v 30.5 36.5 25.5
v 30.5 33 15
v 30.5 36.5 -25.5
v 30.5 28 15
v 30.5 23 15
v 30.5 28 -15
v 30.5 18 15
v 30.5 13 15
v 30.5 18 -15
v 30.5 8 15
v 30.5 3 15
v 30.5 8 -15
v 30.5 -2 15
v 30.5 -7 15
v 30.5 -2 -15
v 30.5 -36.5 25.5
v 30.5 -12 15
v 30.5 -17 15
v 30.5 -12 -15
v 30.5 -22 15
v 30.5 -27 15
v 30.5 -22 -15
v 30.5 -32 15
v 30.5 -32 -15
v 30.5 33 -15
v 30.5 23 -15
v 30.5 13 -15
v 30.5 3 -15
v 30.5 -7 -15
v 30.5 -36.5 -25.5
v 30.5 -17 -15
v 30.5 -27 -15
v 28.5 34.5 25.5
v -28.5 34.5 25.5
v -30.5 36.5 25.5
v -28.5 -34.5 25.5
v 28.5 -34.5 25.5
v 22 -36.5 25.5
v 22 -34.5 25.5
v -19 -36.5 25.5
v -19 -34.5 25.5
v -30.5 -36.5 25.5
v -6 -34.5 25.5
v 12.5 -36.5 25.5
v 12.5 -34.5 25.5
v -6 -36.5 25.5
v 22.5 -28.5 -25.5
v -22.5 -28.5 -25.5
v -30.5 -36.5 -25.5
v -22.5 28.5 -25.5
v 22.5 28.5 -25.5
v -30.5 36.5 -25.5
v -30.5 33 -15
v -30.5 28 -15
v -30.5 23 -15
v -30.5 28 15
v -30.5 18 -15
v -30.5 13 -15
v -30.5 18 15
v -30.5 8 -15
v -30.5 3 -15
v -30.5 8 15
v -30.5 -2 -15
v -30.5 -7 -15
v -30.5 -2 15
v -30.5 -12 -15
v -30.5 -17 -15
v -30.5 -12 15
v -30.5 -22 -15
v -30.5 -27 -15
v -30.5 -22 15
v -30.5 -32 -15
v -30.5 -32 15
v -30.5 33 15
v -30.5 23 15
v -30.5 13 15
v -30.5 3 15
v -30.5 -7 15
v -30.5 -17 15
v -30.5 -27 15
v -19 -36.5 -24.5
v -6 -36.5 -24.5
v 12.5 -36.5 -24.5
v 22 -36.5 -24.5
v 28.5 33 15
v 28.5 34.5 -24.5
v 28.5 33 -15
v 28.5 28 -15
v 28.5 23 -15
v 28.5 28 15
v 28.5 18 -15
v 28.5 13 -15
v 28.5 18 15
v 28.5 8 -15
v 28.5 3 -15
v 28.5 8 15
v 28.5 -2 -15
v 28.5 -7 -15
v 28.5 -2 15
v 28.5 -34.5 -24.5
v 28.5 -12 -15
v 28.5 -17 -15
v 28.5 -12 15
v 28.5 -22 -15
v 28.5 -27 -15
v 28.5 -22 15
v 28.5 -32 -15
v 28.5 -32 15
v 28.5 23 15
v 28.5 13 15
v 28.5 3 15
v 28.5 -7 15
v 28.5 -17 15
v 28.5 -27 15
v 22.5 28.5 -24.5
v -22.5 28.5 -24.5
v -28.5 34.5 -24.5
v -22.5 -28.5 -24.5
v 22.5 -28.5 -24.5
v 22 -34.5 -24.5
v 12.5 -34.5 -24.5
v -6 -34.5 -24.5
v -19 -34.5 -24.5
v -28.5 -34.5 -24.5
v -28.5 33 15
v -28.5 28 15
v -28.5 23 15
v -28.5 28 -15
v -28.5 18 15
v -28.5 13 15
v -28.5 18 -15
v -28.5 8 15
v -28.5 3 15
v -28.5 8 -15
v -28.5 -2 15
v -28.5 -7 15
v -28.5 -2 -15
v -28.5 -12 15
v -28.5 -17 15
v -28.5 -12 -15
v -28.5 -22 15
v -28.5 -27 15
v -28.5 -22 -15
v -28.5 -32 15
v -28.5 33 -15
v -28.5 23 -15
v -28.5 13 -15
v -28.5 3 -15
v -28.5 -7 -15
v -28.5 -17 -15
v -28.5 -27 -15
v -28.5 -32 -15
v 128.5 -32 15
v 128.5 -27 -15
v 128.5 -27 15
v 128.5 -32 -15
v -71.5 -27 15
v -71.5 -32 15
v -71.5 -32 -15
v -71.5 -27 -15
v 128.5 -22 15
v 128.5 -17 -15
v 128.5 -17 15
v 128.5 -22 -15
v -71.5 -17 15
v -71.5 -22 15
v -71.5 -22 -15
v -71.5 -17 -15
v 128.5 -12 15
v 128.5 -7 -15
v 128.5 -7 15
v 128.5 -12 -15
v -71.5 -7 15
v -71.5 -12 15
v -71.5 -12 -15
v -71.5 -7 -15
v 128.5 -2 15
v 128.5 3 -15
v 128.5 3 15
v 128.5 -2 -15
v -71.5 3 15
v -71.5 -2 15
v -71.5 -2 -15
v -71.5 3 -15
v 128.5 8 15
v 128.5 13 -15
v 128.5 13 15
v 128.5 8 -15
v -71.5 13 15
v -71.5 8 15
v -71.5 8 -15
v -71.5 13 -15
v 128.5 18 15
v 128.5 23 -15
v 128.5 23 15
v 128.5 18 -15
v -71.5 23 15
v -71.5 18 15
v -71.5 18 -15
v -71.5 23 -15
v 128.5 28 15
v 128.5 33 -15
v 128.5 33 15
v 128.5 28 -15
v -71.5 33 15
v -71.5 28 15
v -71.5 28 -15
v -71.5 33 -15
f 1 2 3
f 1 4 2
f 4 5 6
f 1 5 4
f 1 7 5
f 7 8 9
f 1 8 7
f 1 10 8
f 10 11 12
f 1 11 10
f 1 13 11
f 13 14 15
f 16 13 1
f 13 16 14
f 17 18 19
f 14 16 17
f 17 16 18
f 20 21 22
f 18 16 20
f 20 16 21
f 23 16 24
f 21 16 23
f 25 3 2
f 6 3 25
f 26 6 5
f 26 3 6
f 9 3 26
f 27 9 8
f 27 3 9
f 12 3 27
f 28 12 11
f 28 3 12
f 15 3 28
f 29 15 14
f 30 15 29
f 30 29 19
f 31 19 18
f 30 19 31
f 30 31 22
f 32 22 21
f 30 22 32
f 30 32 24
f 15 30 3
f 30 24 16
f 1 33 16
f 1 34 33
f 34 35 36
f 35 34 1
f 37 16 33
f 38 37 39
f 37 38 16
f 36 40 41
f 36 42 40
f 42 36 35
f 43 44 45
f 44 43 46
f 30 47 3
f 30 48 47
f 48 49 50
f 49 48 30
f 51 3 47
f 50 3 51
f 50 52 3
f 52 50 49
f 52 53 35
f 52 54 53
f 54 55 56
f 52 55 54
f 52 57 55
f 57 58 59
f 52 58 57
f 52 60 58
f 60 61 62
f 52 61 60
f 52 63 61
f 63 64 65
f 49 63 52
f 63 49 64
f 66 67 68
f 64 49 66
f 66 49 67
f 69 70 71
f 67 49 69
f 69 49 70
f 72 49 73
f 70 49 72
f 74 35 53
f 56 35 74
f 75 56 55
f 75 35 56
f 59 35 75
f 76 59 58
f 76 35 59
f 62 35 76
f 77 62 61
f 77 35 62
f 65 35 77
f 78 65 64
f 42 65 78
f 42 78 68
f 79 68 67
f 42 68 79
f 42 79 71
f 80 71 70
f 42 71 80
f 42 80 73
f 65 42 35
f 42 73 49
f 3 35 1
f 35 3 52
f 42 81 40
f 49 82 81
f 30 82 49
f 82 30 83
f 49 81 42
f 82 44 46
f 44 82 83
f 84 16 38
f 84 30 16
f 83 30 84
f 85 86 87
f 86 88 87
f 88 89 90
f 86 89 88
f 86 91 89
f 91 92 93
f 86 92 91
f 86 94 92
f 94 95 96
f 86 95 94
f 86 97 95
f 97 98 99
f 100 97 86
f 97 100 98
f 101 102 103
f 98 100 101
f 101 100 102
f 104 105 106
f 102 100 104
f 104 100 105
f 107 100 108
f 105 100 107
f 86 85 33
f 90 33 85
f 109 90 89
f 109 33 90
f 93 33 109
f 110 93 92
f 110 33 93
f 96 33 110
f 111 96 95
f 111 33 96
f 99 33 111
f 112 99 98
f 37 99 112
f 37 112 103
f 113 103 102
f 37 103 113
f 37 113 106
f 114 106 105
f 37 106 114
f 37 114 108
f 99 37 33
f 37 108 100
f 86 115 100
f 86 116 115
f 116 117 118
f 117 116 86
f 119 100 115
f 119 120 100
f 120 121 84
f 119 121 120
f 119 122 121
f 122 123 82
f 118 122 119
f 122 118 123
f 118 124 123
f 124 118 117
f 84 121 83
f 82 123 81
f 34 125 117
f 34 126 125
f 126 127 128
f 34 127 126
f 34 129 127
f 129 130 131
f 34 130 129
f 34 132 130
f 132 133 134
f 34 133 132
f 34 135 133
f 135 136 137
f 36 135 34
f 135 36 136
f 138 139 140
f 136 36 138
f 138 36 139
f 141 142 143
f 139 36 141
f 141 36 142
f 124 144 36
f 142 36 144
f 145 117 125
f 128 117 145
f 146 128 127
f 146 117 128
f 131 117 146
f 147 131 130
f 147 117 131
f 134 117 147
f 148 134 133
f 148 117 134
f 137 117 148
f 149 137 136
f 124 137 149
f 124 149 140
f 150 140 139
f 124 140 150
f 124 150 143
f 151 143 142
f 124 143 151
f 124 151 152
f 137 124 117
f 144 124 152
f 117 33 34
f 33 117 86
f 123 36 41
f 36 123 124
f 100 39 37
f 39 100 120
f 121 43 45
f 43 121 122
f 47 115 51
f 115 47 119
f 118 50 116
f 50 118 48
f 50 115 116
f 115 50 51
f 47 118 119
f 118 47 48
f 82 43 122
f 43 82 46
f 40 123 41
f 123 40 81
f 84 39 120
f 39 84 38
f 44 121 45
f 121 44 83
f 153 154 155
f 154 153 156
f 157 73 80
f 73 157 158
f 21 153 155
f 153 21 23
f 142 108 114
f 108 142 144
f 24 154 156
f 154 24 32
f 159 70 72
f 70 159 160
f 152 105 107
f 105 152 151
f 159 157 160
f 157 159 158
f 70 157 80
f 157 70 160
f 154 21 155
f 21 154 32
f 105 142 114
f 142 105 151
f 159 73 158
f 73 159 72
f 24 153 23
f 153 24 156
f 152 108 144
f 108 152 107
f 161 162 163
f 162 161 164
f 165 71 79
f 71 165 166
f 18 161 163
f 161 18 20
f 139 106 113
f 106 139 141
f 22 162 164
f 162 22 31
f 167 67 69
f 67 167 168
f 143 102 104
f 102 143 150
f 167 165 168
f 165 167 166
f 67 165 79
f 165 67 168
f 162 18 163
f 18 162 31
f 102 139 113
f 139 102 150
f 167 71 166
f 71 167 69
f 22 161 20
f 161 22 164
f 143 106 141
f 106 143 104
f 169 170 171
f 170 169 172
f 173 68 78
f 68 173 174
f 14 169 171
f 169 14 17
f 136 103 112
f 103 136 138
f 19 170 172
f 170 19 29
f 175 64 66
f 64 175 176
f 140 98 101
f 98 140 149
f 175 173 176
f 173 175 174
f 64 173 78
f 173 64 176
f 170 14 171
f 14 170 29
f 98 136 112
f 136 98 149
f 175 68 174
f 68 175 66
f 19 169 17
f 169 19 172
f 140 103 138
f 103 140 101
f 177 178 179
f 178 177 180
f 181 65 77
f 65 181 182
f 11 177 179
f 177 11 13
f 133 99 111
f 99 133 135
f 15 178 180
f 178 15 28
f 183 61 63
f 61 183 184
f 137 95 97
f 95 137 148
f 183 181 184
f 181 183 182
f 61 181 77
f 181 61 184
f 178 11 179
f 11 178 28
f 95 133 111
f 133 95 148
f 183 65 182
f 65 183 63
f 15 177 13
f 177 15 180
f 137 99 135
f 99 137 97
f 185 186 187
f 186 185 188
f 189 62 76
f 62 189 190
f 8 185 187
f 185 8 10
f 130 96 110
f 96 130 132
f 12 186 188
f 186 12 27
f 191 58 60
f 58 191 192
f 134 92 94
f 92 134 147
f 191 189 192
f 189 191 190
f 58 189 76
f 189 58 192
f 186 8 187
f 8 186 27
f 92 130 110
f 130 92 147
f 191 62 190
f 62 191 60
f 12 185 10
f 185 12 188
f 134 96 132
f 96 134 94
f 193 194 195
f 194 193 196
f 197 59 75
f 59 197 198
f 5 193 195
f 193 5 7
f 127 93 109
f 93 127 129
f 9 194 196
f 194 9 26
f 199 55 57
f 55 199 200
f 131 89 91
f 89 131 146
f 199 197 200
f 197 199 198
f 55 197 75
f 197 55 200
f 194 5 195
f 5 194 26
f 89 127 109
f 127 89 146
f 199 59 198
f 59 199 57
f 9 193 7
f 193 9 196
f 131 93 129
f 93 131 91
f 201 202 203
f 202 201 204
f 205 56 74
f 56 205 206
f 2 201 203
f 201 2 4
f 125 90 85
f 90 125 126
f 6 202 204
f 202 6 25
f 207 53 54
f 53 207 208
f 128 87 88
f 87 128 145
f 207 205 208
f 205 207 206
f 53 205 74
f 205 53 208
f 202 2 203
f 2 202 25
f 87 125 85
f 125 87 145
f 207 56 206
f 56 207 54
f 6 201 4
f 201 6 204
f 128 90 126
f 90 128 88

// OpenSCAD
arduino_width = 57;
arduino_length = 69;
arduino_usb_width = 13;
arduino_usb_height = 50;
arduino_usb_x = 9.5;
arduino_power_width = 9.5;
arduino_power_height = 50;
arduino_power_x = 6.5;

wall_thickness = 2;
wall_height = 50;
bottom_thickness = 1;
side_shoulder = 6;

side_hole_width = 5;
side_hole_height = 30;

difference()
{
	// Exterior box
	cube([arduino_width+(2*wall_thickness),arduino_length+(2*wall_thickness),wall_height+bottom_thickness], center=true);

	// Interior recess
	translate([0,0,bottom_thickness/2.0])
		cube([arduino_width,arduino_length,wall_height], center=true);

	// Bottom hole
	cube([arduino_width-(2*side_shoulder),arduino_length-(2*side_shoulder),wall_height+bottom_thickness], center=true);

	// USB hole
	translate([	-1*((arduino_width/2.0)-(arduino_usb_width/2.0)-arduino_usb_x),
			-1*(arduino_length/2.0)-(wall_thickness/2.0),
			-1*(wall_height/2.0 - arduino_usb_height/2.0)+bottom_thickness/2.0])
	{
		cube([arduino_usb_width,wall_thickness,arduino_usb_height], center=true);
	}

	// Power hole
	translate([	((arduino_width/2.0)-(arduino_power_width/2.0)-arduino_power_x),
			-1*(arduino_length/2.0)-(wall_thickness/2.0),
			-1*(wall_height/2.0 - arduino_power_height/2.0)+bottom_thickness/2.0])
	{
		cube([arduino_power_width,wall_thickness,arduino_power_height], center=true);
	}
    
    
}

// Side holes
    for ( i = [0 : 1 : 6] ){
      translate([arduino_width/2.0,side_hole_width-arduino_length/2 + i*10,0]){
        cube([200,side_hole_width,side_hole_height], center=true);
      }
    }
